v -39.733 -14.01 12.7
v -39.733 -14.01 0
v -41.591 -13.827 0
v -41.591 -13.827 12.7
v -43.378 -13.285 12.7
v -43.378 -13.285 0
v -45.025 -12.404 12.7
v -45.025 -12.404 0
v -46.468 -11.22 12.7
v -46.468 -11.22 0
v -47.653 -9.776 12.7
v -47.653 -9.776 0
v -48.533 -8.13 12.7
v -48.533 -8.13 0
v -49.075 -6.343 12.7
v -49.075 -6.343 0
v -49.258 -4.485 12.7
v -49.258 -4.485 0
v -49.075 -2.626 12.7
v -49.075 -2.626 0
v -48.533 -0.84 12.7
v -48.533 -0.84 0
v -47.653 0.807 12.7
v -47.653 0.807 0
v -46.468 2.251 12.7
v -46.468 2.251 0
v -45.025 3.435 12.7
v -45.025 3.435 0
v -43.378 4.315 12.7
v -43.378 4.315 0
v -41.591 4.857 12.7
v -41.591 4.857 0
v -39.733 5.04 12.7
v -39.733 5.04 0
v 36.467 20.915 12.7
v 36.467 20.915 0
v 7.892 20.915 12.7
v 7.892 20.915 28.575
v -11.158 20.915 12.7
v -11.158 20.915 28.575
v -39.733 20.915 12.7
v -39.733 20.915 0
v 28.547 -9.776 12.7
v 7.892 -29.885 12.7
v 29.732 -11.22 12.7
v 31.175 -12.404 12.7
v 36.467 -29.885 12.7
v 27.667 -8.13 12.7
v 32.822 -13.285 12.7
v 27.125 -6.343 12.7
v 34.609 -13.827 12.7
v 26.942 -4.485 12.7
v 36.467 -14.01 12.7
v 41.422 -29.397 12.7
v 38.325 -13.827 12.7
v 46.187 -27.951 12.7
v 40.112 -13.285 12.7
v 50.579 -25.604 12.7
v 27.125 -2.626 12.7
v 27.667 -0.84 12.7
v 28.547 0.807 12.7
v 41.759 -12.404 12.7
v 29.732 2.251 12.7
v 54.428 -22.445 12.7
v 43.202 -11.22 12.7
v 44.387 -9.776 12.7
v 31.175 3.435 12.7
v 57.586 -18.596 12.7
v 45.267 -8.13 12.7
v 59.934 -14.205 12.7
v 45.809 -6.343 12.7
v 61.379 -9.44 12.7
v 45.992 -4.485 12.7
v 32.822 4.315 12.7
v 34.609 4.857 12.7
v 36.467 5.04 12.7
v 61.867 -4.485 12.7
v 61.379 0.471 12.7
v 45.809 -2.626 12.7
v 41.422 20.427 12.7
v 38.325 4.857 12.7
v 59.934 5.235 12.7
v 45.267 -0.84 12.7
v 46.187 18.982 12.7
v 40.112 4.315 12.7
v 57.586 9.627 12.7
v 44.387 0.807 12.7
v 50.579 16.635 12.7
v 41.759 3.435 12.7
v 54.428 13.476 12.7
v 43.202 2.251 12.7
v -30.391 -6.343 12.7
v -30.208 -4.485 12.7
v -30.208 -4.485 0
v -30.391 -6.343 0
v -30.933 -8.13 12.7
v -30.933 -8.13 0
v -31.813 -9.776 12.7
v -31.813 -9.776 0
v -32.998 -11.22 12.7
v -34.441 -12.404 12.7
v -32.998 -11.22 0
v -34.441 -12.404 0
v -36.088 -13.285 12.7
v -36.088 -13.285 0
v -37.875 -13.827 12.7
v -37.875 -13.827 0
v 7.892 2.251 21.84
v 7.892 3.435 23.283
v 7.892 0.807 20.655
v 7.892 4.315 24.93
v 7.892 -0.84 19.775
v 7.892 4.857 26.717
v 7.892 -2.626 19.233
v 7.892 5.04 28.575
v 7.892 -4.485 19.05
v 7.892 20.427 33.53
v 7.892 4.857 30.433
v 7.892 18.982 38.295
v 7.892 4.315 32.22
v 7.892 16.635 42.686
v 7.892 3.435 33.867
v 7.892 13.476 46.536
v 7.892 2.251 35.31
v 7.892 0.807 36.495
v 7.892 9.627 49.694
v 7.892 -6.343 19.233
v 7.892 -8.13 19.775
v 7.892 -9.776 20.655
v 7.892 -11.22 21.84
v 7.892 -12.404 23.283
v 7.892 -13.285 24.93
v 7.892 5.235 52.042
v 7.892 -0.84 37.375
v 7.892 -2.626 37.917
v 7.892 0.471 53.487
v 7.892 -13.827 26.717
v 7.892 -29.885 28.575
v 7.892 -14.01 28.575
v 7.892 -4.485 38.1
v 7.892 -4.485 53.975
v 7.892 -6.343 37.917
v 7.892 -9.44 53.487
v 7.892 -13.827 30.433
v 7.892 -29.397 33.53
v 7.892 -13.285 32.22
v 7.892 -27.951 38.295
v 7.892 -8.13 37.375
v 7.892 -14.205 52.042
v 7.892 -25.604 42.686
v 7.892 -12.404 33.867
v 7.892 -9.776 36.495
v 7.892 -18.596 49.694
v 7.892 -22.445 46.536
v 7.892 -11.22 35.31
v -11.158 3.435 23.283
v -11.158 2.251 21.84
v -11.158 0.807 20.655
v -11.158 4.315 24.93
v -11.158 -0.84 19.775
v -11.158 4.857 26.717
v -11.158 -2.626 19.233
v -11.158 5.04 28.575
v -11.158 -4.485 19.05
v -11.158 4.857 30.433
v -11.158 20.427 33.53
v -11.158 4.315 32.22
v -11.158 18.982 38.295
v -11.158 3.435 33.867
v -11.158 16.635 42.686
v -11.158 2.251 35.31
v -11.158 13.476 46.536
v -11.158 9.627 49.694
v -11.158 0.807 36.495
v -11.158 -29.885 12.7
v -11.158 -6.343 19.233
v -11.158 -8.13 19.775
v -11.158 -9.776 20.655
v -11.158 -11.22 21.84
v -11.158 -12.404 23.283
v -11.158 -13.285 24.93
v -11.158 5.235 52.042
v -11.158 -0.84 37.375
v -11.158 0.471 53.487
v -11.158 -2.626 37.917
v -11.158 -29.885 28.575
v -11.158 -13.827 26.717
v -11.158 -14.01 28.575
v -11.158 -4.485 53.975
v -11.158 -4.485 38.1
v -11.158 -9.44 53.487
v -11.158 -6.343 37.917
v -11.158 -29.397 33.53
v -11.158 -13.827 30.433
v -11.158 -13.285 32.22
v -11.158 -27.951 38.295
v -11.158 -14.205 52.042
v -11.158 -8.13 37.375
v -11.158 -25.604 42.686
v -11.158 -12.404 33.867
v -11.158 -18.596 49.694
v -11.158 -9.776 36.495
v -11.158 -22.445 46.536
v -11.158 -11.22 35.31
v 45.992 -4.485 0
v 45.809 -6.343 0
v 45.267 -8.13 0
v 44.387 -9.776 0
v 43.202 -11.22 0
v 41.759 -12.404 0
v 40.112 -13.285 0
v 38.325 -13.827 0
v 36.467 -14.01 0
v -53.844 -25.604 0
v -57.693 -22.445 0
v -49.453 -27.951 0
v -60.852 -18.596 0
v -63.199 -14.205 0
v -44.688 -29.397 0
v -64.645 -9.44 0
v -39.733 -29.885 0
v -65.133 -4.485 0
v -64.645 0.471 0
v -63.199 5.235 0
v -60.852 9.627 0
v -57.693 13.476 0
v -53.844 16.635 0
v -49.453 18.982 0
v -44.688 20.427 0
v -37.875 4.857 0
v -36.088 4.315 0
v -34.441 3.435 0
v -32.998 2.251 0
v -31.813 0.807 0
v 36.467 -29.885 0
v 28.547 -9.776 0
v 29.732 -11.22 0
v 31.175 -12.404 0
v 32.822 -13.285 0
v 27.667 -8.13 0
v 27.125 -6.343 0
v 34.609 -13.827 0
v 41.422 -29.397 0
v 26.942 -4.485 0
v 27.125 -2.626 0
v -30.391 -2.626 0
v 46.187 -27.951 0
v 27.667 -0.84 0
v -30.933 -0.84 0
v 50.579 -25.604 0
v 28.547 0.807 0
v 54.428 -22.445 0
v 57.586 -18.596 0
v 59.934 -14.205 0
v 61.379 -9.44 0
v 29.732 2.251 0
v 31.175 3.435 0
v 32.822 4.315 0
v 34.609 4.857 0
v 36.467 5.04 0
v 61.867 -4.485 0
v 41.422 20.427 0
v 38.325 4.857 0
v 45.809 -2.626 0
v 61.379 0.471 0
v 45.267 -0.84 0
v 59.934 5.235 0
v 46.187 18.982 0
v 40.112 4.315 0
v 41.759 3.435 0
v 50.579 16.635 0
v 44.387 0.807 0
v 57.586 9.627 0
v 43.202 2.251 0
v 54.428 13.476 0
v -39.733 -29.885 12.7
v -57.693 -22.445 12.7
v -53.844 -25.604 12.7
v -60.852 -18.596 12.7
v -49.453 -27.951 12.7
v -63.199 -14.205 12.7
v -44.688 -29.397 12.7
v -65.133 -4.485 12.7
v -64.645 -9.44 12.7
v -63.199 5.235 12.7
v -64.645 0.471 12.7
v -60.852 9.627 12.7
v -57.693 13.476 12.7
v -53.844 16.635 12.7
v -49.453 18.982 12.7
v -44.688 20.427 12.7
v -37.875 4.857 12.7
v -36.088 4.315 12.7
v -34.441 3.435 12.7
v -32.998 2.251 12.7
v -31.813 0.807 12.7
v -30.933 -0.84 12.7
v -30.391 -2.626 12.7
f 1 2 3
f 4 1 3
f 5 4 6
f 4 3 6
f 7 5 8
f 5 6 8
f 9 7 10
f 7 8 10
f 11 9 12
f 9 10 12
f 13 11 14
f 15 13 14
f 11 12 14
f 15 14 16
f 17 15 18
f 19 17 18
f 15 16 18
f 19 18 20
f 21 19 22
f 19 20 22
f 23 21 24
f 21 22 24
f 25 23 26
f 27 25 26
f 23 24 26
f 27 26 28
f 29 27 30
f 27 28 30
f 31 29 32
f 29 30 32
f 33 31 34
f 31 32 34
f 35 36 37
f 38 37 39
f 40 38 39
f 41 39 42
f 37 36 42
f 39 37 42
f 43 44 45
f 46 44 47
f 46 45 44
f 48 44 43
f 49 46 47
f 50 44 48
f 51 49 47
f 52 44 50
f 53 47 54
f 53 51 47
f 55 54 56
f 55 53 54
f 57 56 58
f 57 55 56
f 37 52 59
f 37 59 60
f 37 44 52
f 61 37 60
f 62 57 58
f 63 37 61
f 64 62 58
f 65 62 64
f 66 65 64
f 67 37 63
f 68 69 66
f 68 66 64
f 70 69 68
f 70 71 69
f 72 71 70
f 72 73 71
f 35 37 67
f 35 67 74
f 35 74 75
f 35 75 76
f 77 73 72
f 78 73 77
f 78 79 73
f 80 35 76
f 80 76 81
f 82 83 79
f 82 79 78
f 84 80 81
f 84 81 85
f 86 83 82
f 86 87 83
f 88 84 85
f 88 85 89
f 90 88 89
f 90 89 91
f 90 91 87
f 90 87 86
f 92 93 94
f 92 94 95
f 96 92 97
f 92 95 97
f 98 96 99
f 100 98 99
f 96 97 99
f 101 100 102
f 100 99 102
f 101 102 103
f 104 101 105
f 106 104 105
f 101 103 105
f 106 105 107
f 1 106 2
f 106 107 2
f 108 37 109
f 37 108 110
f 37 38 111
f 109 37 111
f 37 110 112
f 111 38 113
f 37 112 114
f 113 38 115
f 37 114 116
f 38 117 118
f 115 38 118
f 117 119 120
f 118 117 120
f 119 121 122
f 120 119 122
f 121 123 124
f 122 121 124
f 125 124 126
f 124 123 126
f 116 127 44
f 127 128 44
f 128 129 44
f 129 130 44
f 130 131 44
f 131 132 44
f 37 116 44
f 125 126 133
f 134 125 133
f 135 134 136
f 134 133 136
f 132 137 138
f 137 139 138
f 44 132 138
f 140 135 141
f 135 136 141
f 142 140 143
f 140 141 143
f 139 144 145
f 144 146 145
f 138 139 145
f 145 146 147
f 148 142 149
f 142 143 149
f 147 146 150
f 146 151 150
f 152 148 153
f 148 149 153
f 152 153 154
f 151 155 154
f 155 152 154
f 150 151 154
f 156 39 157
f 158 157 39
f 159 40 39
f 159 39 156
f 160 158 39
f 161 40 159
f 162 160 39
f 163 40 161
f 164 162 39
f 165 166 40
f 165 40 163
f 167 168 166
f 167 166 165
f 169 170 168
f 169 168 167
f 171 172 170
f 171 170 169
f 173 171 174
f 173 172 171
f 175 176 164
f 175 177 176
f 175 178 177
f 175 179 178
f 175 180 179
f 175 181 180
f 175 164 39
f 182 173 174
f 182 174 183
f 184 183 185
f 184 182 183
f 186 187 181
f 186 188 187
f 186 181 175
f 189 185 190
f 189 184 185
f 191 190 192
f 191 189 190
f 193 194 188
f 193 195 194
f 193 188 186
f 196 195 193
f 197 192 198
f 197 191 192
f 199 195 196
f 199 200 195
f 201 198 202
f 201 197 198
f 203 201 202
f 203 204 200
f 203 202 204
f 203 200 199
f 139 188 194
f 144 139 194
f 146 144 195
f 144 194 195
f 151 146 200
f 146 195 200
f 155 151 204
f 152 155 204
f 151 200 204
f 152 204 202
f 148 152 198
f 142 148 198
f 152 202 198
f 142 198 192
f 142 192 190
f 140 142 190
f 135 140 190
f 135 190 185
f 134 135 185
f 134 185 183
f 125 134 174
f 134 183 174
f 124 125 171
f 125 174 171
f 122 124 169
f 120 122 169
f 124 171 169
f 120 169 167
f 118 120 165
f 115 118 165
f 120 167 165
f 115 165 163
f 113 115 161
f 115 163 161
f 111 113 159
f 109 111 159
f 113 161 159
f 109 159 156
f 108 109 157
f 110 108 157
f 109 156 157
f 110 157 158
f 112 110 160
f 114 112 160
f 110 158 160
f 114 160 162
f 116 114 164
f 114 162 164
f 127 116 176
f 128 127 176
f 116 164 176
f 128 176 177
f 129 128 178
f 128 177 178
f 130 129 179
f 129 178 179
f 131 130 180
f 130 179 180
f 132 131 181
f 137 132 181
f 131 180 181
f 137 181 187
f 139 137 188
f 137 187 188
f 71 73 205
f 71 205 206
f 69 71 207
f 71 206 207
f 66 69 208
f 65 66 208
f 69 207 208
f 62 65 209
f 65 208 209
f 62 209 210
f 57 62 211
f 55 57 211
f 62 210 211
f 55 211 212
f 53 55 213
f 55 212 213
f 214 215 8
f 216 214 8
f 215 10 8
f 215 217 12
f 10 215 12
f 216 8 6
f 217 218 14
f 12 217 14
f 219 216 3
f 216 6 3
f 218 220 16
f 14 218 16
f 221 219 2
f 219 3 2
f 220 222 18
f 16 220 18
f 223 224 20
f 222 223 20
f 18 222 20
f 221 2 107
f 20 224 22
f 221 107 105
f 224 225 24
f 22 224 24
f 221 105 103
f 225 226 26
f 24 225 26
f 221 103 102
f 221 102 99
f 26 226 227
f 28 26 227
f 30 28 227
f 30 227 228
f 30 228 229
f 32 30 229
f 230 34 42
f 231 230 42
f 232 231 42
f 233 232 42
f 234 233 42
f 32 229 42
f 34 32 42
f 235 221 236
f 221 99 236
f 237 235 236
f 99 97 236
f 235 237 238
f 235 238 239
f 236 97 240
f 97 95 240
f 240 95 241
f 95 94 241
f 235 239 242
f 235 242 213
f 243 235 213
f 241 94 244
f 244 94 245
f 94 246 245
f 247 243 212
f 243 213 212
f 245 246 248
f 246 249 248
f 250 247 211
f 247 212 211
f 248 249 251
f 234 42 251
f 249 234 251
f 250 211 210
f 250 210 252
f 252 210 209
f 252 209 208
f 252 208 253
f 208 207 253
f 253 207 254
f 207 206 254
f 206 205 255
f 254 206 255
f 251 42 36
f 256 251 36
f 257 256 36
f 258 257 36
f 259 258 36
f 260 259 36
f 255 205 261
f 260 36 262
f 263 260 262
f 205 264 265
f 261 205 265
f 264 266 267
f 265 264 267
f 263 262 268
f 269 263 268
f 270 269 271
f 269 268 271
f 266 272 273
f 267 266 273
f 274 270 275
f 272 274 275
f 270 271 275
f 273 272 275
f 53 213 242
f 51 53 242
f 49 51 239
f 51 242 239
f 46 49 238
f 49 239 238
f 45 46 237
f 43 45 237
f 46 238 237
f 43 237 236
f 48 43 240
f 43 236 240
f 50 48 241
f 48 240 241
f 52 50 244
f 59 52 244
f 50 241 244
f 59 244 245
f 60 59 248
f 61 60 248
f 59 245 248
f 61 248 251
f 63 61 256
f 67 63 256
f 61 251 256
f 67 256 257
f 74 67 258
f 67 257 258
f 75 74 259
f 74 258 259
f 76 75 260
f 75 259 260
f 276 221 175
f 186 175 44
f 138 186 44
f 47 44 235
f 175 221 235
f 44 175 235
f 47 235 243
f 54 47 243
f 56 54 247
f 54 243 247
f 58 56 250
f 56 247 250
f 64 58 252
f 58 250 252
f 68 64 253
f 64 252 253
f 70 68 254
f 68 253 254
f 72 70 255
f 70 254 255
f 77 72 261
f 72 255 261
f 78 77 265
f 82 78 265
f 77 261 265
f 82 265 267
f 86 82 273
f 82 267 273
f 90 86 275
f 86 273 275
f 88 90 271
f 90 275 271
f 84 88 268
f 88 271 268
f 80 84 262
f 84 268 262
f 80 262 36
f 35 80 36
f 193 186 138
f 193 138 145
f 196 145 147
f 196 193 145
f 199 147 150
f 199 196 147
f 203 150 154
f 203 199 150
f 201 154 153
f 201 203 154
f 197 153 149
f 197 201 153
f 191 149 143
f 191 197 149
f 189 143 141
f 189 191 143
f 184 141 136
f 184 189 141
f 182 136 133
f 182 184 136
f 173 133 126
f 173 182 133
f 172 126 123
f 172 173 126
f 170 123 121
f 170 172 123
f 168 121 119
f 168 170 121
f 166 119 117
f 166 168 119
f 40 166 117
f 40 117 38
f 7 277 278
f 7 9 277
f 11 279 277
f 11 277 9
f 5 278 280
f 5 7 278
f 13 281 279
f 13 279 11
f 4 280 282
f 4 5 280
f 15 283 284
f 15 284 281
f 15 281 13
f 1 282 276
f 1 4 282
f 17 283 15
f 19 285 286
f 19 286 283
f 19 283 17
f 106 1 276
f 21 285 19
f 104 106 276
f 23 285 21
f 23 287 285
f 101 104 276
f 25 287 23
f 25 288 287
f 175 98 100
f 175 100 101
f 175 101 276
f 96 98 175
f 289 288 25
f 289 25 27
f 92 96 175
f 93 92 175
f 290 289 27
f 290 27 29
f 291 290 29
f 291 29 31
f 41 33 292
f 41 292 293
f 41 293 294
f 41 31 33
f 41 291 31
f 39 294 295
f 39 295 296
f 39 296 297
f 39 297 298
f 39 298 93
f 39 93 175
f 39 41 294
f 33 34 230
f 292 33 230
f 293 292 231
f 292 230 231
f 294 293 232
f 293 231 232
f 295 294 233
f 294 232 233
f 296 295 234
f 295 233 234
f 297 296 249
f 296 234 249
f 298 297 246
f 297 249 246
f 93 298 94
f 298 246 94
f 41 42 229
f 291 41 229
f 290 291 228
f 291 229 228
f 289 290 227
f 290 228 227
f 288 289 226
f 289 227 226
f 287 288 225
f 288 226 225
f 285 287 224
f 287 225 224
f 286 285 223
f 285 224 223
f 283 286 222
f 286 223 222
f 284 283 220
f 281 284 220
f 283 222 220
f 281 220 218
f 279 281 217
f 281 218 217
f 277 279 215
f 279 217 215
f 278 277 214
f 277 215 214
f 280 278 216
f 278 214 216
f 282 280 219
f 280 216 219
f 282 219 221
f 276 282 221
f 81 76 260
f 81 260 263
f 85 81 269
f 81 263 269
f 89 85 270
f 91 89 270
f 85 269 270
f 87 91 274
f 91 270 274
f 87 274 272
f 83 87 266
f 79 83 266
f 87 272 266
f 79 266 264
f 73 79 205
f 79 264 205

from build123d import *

# Parameters (mm, degrees)
F1_DEPTH = 12.7
F2_W     = 19.05
F2_H     = 50.8
F3_DEPTH = 15.875
F5_DEPTH = 19.05
F6_R     = 9.525
F7_DEPTH = 19.05


with BuildPart() as f1:
    # F0 (on Top) → F1 (new body)
    with BuildSketch(Plane.XY):
        with BuildLine():
            Line((36.467142, 20.915313), (-39.732858, 20.915313))
            Line((-39.732858, 20.915313), (-39.732858, 5.040313))
            ThreePointArc((-39.732858, 5.040313), (-32.997666, 2.250505), (-30.207858, -4.484687))
            ThreePointArc((-30.207858, -4.484687), (-32.997666, -11.219879), (-39.732858, -14.009687))
            Line((-39.732858, -14.009687), (-39.732858, -29.884687))
            Line((-39.732858, -29.884687), (36.467142, -29.884687))
            Line((36.467142, -29.884687), (36.467142, -14.009687))
            ThreePointArc((36.467142, -14.009687), (26.942142, -4.484687), (36.467142, 5.040313))
            Line((36.467142, 5.040313), (36.467142, 20.915313))
        make_face()
        with BuildLine():
            Line((-39.732858, 5.040313), (-39.732858, 20.915313))
            ThreePointArc((-39.732858, 20.915313), (-65.132858, -4.484687), (-39.732858, -29.884687))
            Line((-39.732858, -29.884687), (-39.732858, -14.009687))
            ThreePointArc((-39.732858, -14.009687), (-49.257858, -4.484687), (-39.732858, 5.040313))
        make_face()
        with BuildLine():
            ThreePointArc((36.467142, -29.884687), (61.867142, -4.484687), (36.467142, 20.915313))
            Line((36.467142, 20.915313), (36.467142, 5.040313))
            ThreePointArc((36.467142, 5.040313), (43.202334, 2.250505), (45.992142, -4.484687))
            ThreePointArc((45.992142, -4.484687), (43.202334, -11.219879), (36.467142, -14.009687))
            Line((36.467142, -14.009687), (36.467142, -29.884687))
        make_face()
    extrude(amount=F1_DEPTH)

    # F2 (on face) → F3 (join)
    with BuildSketch(Plane.XY.offset(12.7)):
        with Locations((-1.632858, -4.484687)):
            Rectangle(F2_W, F2_H)
    extrude(amount=F3_DEPTH)

    # F4 (on face) → F5 (join)
    with BuildSketch(Plane(origin=(-11.157858, 0, 0), x_dir=(0, -1, 0), z_dir=(-1, 0, 0))):
        with BuildLine():
            Line((-20.915313, 28.575), (29.884687, 28.575))
            ThreePointArc((29.884687, 28.575), (4.484687, 53.975), (-20.915313, 28.575))
        make_face()
    extrude(amount=-F5_DEPTH)

    # F6 (on face) → F7 (cut)
    with BuildSketch(Plane(origin=(-11.157858, 0, 0), x_dir=(0, -1, 0), z_dir=(-1, 0, 0))):
        with Locations((4.484687, 28.575)):
            Circle(F6_R)
    extrude(amount=-F7_DEPTH, mode=Mode.SUBTRACT)


solid = f1.part
